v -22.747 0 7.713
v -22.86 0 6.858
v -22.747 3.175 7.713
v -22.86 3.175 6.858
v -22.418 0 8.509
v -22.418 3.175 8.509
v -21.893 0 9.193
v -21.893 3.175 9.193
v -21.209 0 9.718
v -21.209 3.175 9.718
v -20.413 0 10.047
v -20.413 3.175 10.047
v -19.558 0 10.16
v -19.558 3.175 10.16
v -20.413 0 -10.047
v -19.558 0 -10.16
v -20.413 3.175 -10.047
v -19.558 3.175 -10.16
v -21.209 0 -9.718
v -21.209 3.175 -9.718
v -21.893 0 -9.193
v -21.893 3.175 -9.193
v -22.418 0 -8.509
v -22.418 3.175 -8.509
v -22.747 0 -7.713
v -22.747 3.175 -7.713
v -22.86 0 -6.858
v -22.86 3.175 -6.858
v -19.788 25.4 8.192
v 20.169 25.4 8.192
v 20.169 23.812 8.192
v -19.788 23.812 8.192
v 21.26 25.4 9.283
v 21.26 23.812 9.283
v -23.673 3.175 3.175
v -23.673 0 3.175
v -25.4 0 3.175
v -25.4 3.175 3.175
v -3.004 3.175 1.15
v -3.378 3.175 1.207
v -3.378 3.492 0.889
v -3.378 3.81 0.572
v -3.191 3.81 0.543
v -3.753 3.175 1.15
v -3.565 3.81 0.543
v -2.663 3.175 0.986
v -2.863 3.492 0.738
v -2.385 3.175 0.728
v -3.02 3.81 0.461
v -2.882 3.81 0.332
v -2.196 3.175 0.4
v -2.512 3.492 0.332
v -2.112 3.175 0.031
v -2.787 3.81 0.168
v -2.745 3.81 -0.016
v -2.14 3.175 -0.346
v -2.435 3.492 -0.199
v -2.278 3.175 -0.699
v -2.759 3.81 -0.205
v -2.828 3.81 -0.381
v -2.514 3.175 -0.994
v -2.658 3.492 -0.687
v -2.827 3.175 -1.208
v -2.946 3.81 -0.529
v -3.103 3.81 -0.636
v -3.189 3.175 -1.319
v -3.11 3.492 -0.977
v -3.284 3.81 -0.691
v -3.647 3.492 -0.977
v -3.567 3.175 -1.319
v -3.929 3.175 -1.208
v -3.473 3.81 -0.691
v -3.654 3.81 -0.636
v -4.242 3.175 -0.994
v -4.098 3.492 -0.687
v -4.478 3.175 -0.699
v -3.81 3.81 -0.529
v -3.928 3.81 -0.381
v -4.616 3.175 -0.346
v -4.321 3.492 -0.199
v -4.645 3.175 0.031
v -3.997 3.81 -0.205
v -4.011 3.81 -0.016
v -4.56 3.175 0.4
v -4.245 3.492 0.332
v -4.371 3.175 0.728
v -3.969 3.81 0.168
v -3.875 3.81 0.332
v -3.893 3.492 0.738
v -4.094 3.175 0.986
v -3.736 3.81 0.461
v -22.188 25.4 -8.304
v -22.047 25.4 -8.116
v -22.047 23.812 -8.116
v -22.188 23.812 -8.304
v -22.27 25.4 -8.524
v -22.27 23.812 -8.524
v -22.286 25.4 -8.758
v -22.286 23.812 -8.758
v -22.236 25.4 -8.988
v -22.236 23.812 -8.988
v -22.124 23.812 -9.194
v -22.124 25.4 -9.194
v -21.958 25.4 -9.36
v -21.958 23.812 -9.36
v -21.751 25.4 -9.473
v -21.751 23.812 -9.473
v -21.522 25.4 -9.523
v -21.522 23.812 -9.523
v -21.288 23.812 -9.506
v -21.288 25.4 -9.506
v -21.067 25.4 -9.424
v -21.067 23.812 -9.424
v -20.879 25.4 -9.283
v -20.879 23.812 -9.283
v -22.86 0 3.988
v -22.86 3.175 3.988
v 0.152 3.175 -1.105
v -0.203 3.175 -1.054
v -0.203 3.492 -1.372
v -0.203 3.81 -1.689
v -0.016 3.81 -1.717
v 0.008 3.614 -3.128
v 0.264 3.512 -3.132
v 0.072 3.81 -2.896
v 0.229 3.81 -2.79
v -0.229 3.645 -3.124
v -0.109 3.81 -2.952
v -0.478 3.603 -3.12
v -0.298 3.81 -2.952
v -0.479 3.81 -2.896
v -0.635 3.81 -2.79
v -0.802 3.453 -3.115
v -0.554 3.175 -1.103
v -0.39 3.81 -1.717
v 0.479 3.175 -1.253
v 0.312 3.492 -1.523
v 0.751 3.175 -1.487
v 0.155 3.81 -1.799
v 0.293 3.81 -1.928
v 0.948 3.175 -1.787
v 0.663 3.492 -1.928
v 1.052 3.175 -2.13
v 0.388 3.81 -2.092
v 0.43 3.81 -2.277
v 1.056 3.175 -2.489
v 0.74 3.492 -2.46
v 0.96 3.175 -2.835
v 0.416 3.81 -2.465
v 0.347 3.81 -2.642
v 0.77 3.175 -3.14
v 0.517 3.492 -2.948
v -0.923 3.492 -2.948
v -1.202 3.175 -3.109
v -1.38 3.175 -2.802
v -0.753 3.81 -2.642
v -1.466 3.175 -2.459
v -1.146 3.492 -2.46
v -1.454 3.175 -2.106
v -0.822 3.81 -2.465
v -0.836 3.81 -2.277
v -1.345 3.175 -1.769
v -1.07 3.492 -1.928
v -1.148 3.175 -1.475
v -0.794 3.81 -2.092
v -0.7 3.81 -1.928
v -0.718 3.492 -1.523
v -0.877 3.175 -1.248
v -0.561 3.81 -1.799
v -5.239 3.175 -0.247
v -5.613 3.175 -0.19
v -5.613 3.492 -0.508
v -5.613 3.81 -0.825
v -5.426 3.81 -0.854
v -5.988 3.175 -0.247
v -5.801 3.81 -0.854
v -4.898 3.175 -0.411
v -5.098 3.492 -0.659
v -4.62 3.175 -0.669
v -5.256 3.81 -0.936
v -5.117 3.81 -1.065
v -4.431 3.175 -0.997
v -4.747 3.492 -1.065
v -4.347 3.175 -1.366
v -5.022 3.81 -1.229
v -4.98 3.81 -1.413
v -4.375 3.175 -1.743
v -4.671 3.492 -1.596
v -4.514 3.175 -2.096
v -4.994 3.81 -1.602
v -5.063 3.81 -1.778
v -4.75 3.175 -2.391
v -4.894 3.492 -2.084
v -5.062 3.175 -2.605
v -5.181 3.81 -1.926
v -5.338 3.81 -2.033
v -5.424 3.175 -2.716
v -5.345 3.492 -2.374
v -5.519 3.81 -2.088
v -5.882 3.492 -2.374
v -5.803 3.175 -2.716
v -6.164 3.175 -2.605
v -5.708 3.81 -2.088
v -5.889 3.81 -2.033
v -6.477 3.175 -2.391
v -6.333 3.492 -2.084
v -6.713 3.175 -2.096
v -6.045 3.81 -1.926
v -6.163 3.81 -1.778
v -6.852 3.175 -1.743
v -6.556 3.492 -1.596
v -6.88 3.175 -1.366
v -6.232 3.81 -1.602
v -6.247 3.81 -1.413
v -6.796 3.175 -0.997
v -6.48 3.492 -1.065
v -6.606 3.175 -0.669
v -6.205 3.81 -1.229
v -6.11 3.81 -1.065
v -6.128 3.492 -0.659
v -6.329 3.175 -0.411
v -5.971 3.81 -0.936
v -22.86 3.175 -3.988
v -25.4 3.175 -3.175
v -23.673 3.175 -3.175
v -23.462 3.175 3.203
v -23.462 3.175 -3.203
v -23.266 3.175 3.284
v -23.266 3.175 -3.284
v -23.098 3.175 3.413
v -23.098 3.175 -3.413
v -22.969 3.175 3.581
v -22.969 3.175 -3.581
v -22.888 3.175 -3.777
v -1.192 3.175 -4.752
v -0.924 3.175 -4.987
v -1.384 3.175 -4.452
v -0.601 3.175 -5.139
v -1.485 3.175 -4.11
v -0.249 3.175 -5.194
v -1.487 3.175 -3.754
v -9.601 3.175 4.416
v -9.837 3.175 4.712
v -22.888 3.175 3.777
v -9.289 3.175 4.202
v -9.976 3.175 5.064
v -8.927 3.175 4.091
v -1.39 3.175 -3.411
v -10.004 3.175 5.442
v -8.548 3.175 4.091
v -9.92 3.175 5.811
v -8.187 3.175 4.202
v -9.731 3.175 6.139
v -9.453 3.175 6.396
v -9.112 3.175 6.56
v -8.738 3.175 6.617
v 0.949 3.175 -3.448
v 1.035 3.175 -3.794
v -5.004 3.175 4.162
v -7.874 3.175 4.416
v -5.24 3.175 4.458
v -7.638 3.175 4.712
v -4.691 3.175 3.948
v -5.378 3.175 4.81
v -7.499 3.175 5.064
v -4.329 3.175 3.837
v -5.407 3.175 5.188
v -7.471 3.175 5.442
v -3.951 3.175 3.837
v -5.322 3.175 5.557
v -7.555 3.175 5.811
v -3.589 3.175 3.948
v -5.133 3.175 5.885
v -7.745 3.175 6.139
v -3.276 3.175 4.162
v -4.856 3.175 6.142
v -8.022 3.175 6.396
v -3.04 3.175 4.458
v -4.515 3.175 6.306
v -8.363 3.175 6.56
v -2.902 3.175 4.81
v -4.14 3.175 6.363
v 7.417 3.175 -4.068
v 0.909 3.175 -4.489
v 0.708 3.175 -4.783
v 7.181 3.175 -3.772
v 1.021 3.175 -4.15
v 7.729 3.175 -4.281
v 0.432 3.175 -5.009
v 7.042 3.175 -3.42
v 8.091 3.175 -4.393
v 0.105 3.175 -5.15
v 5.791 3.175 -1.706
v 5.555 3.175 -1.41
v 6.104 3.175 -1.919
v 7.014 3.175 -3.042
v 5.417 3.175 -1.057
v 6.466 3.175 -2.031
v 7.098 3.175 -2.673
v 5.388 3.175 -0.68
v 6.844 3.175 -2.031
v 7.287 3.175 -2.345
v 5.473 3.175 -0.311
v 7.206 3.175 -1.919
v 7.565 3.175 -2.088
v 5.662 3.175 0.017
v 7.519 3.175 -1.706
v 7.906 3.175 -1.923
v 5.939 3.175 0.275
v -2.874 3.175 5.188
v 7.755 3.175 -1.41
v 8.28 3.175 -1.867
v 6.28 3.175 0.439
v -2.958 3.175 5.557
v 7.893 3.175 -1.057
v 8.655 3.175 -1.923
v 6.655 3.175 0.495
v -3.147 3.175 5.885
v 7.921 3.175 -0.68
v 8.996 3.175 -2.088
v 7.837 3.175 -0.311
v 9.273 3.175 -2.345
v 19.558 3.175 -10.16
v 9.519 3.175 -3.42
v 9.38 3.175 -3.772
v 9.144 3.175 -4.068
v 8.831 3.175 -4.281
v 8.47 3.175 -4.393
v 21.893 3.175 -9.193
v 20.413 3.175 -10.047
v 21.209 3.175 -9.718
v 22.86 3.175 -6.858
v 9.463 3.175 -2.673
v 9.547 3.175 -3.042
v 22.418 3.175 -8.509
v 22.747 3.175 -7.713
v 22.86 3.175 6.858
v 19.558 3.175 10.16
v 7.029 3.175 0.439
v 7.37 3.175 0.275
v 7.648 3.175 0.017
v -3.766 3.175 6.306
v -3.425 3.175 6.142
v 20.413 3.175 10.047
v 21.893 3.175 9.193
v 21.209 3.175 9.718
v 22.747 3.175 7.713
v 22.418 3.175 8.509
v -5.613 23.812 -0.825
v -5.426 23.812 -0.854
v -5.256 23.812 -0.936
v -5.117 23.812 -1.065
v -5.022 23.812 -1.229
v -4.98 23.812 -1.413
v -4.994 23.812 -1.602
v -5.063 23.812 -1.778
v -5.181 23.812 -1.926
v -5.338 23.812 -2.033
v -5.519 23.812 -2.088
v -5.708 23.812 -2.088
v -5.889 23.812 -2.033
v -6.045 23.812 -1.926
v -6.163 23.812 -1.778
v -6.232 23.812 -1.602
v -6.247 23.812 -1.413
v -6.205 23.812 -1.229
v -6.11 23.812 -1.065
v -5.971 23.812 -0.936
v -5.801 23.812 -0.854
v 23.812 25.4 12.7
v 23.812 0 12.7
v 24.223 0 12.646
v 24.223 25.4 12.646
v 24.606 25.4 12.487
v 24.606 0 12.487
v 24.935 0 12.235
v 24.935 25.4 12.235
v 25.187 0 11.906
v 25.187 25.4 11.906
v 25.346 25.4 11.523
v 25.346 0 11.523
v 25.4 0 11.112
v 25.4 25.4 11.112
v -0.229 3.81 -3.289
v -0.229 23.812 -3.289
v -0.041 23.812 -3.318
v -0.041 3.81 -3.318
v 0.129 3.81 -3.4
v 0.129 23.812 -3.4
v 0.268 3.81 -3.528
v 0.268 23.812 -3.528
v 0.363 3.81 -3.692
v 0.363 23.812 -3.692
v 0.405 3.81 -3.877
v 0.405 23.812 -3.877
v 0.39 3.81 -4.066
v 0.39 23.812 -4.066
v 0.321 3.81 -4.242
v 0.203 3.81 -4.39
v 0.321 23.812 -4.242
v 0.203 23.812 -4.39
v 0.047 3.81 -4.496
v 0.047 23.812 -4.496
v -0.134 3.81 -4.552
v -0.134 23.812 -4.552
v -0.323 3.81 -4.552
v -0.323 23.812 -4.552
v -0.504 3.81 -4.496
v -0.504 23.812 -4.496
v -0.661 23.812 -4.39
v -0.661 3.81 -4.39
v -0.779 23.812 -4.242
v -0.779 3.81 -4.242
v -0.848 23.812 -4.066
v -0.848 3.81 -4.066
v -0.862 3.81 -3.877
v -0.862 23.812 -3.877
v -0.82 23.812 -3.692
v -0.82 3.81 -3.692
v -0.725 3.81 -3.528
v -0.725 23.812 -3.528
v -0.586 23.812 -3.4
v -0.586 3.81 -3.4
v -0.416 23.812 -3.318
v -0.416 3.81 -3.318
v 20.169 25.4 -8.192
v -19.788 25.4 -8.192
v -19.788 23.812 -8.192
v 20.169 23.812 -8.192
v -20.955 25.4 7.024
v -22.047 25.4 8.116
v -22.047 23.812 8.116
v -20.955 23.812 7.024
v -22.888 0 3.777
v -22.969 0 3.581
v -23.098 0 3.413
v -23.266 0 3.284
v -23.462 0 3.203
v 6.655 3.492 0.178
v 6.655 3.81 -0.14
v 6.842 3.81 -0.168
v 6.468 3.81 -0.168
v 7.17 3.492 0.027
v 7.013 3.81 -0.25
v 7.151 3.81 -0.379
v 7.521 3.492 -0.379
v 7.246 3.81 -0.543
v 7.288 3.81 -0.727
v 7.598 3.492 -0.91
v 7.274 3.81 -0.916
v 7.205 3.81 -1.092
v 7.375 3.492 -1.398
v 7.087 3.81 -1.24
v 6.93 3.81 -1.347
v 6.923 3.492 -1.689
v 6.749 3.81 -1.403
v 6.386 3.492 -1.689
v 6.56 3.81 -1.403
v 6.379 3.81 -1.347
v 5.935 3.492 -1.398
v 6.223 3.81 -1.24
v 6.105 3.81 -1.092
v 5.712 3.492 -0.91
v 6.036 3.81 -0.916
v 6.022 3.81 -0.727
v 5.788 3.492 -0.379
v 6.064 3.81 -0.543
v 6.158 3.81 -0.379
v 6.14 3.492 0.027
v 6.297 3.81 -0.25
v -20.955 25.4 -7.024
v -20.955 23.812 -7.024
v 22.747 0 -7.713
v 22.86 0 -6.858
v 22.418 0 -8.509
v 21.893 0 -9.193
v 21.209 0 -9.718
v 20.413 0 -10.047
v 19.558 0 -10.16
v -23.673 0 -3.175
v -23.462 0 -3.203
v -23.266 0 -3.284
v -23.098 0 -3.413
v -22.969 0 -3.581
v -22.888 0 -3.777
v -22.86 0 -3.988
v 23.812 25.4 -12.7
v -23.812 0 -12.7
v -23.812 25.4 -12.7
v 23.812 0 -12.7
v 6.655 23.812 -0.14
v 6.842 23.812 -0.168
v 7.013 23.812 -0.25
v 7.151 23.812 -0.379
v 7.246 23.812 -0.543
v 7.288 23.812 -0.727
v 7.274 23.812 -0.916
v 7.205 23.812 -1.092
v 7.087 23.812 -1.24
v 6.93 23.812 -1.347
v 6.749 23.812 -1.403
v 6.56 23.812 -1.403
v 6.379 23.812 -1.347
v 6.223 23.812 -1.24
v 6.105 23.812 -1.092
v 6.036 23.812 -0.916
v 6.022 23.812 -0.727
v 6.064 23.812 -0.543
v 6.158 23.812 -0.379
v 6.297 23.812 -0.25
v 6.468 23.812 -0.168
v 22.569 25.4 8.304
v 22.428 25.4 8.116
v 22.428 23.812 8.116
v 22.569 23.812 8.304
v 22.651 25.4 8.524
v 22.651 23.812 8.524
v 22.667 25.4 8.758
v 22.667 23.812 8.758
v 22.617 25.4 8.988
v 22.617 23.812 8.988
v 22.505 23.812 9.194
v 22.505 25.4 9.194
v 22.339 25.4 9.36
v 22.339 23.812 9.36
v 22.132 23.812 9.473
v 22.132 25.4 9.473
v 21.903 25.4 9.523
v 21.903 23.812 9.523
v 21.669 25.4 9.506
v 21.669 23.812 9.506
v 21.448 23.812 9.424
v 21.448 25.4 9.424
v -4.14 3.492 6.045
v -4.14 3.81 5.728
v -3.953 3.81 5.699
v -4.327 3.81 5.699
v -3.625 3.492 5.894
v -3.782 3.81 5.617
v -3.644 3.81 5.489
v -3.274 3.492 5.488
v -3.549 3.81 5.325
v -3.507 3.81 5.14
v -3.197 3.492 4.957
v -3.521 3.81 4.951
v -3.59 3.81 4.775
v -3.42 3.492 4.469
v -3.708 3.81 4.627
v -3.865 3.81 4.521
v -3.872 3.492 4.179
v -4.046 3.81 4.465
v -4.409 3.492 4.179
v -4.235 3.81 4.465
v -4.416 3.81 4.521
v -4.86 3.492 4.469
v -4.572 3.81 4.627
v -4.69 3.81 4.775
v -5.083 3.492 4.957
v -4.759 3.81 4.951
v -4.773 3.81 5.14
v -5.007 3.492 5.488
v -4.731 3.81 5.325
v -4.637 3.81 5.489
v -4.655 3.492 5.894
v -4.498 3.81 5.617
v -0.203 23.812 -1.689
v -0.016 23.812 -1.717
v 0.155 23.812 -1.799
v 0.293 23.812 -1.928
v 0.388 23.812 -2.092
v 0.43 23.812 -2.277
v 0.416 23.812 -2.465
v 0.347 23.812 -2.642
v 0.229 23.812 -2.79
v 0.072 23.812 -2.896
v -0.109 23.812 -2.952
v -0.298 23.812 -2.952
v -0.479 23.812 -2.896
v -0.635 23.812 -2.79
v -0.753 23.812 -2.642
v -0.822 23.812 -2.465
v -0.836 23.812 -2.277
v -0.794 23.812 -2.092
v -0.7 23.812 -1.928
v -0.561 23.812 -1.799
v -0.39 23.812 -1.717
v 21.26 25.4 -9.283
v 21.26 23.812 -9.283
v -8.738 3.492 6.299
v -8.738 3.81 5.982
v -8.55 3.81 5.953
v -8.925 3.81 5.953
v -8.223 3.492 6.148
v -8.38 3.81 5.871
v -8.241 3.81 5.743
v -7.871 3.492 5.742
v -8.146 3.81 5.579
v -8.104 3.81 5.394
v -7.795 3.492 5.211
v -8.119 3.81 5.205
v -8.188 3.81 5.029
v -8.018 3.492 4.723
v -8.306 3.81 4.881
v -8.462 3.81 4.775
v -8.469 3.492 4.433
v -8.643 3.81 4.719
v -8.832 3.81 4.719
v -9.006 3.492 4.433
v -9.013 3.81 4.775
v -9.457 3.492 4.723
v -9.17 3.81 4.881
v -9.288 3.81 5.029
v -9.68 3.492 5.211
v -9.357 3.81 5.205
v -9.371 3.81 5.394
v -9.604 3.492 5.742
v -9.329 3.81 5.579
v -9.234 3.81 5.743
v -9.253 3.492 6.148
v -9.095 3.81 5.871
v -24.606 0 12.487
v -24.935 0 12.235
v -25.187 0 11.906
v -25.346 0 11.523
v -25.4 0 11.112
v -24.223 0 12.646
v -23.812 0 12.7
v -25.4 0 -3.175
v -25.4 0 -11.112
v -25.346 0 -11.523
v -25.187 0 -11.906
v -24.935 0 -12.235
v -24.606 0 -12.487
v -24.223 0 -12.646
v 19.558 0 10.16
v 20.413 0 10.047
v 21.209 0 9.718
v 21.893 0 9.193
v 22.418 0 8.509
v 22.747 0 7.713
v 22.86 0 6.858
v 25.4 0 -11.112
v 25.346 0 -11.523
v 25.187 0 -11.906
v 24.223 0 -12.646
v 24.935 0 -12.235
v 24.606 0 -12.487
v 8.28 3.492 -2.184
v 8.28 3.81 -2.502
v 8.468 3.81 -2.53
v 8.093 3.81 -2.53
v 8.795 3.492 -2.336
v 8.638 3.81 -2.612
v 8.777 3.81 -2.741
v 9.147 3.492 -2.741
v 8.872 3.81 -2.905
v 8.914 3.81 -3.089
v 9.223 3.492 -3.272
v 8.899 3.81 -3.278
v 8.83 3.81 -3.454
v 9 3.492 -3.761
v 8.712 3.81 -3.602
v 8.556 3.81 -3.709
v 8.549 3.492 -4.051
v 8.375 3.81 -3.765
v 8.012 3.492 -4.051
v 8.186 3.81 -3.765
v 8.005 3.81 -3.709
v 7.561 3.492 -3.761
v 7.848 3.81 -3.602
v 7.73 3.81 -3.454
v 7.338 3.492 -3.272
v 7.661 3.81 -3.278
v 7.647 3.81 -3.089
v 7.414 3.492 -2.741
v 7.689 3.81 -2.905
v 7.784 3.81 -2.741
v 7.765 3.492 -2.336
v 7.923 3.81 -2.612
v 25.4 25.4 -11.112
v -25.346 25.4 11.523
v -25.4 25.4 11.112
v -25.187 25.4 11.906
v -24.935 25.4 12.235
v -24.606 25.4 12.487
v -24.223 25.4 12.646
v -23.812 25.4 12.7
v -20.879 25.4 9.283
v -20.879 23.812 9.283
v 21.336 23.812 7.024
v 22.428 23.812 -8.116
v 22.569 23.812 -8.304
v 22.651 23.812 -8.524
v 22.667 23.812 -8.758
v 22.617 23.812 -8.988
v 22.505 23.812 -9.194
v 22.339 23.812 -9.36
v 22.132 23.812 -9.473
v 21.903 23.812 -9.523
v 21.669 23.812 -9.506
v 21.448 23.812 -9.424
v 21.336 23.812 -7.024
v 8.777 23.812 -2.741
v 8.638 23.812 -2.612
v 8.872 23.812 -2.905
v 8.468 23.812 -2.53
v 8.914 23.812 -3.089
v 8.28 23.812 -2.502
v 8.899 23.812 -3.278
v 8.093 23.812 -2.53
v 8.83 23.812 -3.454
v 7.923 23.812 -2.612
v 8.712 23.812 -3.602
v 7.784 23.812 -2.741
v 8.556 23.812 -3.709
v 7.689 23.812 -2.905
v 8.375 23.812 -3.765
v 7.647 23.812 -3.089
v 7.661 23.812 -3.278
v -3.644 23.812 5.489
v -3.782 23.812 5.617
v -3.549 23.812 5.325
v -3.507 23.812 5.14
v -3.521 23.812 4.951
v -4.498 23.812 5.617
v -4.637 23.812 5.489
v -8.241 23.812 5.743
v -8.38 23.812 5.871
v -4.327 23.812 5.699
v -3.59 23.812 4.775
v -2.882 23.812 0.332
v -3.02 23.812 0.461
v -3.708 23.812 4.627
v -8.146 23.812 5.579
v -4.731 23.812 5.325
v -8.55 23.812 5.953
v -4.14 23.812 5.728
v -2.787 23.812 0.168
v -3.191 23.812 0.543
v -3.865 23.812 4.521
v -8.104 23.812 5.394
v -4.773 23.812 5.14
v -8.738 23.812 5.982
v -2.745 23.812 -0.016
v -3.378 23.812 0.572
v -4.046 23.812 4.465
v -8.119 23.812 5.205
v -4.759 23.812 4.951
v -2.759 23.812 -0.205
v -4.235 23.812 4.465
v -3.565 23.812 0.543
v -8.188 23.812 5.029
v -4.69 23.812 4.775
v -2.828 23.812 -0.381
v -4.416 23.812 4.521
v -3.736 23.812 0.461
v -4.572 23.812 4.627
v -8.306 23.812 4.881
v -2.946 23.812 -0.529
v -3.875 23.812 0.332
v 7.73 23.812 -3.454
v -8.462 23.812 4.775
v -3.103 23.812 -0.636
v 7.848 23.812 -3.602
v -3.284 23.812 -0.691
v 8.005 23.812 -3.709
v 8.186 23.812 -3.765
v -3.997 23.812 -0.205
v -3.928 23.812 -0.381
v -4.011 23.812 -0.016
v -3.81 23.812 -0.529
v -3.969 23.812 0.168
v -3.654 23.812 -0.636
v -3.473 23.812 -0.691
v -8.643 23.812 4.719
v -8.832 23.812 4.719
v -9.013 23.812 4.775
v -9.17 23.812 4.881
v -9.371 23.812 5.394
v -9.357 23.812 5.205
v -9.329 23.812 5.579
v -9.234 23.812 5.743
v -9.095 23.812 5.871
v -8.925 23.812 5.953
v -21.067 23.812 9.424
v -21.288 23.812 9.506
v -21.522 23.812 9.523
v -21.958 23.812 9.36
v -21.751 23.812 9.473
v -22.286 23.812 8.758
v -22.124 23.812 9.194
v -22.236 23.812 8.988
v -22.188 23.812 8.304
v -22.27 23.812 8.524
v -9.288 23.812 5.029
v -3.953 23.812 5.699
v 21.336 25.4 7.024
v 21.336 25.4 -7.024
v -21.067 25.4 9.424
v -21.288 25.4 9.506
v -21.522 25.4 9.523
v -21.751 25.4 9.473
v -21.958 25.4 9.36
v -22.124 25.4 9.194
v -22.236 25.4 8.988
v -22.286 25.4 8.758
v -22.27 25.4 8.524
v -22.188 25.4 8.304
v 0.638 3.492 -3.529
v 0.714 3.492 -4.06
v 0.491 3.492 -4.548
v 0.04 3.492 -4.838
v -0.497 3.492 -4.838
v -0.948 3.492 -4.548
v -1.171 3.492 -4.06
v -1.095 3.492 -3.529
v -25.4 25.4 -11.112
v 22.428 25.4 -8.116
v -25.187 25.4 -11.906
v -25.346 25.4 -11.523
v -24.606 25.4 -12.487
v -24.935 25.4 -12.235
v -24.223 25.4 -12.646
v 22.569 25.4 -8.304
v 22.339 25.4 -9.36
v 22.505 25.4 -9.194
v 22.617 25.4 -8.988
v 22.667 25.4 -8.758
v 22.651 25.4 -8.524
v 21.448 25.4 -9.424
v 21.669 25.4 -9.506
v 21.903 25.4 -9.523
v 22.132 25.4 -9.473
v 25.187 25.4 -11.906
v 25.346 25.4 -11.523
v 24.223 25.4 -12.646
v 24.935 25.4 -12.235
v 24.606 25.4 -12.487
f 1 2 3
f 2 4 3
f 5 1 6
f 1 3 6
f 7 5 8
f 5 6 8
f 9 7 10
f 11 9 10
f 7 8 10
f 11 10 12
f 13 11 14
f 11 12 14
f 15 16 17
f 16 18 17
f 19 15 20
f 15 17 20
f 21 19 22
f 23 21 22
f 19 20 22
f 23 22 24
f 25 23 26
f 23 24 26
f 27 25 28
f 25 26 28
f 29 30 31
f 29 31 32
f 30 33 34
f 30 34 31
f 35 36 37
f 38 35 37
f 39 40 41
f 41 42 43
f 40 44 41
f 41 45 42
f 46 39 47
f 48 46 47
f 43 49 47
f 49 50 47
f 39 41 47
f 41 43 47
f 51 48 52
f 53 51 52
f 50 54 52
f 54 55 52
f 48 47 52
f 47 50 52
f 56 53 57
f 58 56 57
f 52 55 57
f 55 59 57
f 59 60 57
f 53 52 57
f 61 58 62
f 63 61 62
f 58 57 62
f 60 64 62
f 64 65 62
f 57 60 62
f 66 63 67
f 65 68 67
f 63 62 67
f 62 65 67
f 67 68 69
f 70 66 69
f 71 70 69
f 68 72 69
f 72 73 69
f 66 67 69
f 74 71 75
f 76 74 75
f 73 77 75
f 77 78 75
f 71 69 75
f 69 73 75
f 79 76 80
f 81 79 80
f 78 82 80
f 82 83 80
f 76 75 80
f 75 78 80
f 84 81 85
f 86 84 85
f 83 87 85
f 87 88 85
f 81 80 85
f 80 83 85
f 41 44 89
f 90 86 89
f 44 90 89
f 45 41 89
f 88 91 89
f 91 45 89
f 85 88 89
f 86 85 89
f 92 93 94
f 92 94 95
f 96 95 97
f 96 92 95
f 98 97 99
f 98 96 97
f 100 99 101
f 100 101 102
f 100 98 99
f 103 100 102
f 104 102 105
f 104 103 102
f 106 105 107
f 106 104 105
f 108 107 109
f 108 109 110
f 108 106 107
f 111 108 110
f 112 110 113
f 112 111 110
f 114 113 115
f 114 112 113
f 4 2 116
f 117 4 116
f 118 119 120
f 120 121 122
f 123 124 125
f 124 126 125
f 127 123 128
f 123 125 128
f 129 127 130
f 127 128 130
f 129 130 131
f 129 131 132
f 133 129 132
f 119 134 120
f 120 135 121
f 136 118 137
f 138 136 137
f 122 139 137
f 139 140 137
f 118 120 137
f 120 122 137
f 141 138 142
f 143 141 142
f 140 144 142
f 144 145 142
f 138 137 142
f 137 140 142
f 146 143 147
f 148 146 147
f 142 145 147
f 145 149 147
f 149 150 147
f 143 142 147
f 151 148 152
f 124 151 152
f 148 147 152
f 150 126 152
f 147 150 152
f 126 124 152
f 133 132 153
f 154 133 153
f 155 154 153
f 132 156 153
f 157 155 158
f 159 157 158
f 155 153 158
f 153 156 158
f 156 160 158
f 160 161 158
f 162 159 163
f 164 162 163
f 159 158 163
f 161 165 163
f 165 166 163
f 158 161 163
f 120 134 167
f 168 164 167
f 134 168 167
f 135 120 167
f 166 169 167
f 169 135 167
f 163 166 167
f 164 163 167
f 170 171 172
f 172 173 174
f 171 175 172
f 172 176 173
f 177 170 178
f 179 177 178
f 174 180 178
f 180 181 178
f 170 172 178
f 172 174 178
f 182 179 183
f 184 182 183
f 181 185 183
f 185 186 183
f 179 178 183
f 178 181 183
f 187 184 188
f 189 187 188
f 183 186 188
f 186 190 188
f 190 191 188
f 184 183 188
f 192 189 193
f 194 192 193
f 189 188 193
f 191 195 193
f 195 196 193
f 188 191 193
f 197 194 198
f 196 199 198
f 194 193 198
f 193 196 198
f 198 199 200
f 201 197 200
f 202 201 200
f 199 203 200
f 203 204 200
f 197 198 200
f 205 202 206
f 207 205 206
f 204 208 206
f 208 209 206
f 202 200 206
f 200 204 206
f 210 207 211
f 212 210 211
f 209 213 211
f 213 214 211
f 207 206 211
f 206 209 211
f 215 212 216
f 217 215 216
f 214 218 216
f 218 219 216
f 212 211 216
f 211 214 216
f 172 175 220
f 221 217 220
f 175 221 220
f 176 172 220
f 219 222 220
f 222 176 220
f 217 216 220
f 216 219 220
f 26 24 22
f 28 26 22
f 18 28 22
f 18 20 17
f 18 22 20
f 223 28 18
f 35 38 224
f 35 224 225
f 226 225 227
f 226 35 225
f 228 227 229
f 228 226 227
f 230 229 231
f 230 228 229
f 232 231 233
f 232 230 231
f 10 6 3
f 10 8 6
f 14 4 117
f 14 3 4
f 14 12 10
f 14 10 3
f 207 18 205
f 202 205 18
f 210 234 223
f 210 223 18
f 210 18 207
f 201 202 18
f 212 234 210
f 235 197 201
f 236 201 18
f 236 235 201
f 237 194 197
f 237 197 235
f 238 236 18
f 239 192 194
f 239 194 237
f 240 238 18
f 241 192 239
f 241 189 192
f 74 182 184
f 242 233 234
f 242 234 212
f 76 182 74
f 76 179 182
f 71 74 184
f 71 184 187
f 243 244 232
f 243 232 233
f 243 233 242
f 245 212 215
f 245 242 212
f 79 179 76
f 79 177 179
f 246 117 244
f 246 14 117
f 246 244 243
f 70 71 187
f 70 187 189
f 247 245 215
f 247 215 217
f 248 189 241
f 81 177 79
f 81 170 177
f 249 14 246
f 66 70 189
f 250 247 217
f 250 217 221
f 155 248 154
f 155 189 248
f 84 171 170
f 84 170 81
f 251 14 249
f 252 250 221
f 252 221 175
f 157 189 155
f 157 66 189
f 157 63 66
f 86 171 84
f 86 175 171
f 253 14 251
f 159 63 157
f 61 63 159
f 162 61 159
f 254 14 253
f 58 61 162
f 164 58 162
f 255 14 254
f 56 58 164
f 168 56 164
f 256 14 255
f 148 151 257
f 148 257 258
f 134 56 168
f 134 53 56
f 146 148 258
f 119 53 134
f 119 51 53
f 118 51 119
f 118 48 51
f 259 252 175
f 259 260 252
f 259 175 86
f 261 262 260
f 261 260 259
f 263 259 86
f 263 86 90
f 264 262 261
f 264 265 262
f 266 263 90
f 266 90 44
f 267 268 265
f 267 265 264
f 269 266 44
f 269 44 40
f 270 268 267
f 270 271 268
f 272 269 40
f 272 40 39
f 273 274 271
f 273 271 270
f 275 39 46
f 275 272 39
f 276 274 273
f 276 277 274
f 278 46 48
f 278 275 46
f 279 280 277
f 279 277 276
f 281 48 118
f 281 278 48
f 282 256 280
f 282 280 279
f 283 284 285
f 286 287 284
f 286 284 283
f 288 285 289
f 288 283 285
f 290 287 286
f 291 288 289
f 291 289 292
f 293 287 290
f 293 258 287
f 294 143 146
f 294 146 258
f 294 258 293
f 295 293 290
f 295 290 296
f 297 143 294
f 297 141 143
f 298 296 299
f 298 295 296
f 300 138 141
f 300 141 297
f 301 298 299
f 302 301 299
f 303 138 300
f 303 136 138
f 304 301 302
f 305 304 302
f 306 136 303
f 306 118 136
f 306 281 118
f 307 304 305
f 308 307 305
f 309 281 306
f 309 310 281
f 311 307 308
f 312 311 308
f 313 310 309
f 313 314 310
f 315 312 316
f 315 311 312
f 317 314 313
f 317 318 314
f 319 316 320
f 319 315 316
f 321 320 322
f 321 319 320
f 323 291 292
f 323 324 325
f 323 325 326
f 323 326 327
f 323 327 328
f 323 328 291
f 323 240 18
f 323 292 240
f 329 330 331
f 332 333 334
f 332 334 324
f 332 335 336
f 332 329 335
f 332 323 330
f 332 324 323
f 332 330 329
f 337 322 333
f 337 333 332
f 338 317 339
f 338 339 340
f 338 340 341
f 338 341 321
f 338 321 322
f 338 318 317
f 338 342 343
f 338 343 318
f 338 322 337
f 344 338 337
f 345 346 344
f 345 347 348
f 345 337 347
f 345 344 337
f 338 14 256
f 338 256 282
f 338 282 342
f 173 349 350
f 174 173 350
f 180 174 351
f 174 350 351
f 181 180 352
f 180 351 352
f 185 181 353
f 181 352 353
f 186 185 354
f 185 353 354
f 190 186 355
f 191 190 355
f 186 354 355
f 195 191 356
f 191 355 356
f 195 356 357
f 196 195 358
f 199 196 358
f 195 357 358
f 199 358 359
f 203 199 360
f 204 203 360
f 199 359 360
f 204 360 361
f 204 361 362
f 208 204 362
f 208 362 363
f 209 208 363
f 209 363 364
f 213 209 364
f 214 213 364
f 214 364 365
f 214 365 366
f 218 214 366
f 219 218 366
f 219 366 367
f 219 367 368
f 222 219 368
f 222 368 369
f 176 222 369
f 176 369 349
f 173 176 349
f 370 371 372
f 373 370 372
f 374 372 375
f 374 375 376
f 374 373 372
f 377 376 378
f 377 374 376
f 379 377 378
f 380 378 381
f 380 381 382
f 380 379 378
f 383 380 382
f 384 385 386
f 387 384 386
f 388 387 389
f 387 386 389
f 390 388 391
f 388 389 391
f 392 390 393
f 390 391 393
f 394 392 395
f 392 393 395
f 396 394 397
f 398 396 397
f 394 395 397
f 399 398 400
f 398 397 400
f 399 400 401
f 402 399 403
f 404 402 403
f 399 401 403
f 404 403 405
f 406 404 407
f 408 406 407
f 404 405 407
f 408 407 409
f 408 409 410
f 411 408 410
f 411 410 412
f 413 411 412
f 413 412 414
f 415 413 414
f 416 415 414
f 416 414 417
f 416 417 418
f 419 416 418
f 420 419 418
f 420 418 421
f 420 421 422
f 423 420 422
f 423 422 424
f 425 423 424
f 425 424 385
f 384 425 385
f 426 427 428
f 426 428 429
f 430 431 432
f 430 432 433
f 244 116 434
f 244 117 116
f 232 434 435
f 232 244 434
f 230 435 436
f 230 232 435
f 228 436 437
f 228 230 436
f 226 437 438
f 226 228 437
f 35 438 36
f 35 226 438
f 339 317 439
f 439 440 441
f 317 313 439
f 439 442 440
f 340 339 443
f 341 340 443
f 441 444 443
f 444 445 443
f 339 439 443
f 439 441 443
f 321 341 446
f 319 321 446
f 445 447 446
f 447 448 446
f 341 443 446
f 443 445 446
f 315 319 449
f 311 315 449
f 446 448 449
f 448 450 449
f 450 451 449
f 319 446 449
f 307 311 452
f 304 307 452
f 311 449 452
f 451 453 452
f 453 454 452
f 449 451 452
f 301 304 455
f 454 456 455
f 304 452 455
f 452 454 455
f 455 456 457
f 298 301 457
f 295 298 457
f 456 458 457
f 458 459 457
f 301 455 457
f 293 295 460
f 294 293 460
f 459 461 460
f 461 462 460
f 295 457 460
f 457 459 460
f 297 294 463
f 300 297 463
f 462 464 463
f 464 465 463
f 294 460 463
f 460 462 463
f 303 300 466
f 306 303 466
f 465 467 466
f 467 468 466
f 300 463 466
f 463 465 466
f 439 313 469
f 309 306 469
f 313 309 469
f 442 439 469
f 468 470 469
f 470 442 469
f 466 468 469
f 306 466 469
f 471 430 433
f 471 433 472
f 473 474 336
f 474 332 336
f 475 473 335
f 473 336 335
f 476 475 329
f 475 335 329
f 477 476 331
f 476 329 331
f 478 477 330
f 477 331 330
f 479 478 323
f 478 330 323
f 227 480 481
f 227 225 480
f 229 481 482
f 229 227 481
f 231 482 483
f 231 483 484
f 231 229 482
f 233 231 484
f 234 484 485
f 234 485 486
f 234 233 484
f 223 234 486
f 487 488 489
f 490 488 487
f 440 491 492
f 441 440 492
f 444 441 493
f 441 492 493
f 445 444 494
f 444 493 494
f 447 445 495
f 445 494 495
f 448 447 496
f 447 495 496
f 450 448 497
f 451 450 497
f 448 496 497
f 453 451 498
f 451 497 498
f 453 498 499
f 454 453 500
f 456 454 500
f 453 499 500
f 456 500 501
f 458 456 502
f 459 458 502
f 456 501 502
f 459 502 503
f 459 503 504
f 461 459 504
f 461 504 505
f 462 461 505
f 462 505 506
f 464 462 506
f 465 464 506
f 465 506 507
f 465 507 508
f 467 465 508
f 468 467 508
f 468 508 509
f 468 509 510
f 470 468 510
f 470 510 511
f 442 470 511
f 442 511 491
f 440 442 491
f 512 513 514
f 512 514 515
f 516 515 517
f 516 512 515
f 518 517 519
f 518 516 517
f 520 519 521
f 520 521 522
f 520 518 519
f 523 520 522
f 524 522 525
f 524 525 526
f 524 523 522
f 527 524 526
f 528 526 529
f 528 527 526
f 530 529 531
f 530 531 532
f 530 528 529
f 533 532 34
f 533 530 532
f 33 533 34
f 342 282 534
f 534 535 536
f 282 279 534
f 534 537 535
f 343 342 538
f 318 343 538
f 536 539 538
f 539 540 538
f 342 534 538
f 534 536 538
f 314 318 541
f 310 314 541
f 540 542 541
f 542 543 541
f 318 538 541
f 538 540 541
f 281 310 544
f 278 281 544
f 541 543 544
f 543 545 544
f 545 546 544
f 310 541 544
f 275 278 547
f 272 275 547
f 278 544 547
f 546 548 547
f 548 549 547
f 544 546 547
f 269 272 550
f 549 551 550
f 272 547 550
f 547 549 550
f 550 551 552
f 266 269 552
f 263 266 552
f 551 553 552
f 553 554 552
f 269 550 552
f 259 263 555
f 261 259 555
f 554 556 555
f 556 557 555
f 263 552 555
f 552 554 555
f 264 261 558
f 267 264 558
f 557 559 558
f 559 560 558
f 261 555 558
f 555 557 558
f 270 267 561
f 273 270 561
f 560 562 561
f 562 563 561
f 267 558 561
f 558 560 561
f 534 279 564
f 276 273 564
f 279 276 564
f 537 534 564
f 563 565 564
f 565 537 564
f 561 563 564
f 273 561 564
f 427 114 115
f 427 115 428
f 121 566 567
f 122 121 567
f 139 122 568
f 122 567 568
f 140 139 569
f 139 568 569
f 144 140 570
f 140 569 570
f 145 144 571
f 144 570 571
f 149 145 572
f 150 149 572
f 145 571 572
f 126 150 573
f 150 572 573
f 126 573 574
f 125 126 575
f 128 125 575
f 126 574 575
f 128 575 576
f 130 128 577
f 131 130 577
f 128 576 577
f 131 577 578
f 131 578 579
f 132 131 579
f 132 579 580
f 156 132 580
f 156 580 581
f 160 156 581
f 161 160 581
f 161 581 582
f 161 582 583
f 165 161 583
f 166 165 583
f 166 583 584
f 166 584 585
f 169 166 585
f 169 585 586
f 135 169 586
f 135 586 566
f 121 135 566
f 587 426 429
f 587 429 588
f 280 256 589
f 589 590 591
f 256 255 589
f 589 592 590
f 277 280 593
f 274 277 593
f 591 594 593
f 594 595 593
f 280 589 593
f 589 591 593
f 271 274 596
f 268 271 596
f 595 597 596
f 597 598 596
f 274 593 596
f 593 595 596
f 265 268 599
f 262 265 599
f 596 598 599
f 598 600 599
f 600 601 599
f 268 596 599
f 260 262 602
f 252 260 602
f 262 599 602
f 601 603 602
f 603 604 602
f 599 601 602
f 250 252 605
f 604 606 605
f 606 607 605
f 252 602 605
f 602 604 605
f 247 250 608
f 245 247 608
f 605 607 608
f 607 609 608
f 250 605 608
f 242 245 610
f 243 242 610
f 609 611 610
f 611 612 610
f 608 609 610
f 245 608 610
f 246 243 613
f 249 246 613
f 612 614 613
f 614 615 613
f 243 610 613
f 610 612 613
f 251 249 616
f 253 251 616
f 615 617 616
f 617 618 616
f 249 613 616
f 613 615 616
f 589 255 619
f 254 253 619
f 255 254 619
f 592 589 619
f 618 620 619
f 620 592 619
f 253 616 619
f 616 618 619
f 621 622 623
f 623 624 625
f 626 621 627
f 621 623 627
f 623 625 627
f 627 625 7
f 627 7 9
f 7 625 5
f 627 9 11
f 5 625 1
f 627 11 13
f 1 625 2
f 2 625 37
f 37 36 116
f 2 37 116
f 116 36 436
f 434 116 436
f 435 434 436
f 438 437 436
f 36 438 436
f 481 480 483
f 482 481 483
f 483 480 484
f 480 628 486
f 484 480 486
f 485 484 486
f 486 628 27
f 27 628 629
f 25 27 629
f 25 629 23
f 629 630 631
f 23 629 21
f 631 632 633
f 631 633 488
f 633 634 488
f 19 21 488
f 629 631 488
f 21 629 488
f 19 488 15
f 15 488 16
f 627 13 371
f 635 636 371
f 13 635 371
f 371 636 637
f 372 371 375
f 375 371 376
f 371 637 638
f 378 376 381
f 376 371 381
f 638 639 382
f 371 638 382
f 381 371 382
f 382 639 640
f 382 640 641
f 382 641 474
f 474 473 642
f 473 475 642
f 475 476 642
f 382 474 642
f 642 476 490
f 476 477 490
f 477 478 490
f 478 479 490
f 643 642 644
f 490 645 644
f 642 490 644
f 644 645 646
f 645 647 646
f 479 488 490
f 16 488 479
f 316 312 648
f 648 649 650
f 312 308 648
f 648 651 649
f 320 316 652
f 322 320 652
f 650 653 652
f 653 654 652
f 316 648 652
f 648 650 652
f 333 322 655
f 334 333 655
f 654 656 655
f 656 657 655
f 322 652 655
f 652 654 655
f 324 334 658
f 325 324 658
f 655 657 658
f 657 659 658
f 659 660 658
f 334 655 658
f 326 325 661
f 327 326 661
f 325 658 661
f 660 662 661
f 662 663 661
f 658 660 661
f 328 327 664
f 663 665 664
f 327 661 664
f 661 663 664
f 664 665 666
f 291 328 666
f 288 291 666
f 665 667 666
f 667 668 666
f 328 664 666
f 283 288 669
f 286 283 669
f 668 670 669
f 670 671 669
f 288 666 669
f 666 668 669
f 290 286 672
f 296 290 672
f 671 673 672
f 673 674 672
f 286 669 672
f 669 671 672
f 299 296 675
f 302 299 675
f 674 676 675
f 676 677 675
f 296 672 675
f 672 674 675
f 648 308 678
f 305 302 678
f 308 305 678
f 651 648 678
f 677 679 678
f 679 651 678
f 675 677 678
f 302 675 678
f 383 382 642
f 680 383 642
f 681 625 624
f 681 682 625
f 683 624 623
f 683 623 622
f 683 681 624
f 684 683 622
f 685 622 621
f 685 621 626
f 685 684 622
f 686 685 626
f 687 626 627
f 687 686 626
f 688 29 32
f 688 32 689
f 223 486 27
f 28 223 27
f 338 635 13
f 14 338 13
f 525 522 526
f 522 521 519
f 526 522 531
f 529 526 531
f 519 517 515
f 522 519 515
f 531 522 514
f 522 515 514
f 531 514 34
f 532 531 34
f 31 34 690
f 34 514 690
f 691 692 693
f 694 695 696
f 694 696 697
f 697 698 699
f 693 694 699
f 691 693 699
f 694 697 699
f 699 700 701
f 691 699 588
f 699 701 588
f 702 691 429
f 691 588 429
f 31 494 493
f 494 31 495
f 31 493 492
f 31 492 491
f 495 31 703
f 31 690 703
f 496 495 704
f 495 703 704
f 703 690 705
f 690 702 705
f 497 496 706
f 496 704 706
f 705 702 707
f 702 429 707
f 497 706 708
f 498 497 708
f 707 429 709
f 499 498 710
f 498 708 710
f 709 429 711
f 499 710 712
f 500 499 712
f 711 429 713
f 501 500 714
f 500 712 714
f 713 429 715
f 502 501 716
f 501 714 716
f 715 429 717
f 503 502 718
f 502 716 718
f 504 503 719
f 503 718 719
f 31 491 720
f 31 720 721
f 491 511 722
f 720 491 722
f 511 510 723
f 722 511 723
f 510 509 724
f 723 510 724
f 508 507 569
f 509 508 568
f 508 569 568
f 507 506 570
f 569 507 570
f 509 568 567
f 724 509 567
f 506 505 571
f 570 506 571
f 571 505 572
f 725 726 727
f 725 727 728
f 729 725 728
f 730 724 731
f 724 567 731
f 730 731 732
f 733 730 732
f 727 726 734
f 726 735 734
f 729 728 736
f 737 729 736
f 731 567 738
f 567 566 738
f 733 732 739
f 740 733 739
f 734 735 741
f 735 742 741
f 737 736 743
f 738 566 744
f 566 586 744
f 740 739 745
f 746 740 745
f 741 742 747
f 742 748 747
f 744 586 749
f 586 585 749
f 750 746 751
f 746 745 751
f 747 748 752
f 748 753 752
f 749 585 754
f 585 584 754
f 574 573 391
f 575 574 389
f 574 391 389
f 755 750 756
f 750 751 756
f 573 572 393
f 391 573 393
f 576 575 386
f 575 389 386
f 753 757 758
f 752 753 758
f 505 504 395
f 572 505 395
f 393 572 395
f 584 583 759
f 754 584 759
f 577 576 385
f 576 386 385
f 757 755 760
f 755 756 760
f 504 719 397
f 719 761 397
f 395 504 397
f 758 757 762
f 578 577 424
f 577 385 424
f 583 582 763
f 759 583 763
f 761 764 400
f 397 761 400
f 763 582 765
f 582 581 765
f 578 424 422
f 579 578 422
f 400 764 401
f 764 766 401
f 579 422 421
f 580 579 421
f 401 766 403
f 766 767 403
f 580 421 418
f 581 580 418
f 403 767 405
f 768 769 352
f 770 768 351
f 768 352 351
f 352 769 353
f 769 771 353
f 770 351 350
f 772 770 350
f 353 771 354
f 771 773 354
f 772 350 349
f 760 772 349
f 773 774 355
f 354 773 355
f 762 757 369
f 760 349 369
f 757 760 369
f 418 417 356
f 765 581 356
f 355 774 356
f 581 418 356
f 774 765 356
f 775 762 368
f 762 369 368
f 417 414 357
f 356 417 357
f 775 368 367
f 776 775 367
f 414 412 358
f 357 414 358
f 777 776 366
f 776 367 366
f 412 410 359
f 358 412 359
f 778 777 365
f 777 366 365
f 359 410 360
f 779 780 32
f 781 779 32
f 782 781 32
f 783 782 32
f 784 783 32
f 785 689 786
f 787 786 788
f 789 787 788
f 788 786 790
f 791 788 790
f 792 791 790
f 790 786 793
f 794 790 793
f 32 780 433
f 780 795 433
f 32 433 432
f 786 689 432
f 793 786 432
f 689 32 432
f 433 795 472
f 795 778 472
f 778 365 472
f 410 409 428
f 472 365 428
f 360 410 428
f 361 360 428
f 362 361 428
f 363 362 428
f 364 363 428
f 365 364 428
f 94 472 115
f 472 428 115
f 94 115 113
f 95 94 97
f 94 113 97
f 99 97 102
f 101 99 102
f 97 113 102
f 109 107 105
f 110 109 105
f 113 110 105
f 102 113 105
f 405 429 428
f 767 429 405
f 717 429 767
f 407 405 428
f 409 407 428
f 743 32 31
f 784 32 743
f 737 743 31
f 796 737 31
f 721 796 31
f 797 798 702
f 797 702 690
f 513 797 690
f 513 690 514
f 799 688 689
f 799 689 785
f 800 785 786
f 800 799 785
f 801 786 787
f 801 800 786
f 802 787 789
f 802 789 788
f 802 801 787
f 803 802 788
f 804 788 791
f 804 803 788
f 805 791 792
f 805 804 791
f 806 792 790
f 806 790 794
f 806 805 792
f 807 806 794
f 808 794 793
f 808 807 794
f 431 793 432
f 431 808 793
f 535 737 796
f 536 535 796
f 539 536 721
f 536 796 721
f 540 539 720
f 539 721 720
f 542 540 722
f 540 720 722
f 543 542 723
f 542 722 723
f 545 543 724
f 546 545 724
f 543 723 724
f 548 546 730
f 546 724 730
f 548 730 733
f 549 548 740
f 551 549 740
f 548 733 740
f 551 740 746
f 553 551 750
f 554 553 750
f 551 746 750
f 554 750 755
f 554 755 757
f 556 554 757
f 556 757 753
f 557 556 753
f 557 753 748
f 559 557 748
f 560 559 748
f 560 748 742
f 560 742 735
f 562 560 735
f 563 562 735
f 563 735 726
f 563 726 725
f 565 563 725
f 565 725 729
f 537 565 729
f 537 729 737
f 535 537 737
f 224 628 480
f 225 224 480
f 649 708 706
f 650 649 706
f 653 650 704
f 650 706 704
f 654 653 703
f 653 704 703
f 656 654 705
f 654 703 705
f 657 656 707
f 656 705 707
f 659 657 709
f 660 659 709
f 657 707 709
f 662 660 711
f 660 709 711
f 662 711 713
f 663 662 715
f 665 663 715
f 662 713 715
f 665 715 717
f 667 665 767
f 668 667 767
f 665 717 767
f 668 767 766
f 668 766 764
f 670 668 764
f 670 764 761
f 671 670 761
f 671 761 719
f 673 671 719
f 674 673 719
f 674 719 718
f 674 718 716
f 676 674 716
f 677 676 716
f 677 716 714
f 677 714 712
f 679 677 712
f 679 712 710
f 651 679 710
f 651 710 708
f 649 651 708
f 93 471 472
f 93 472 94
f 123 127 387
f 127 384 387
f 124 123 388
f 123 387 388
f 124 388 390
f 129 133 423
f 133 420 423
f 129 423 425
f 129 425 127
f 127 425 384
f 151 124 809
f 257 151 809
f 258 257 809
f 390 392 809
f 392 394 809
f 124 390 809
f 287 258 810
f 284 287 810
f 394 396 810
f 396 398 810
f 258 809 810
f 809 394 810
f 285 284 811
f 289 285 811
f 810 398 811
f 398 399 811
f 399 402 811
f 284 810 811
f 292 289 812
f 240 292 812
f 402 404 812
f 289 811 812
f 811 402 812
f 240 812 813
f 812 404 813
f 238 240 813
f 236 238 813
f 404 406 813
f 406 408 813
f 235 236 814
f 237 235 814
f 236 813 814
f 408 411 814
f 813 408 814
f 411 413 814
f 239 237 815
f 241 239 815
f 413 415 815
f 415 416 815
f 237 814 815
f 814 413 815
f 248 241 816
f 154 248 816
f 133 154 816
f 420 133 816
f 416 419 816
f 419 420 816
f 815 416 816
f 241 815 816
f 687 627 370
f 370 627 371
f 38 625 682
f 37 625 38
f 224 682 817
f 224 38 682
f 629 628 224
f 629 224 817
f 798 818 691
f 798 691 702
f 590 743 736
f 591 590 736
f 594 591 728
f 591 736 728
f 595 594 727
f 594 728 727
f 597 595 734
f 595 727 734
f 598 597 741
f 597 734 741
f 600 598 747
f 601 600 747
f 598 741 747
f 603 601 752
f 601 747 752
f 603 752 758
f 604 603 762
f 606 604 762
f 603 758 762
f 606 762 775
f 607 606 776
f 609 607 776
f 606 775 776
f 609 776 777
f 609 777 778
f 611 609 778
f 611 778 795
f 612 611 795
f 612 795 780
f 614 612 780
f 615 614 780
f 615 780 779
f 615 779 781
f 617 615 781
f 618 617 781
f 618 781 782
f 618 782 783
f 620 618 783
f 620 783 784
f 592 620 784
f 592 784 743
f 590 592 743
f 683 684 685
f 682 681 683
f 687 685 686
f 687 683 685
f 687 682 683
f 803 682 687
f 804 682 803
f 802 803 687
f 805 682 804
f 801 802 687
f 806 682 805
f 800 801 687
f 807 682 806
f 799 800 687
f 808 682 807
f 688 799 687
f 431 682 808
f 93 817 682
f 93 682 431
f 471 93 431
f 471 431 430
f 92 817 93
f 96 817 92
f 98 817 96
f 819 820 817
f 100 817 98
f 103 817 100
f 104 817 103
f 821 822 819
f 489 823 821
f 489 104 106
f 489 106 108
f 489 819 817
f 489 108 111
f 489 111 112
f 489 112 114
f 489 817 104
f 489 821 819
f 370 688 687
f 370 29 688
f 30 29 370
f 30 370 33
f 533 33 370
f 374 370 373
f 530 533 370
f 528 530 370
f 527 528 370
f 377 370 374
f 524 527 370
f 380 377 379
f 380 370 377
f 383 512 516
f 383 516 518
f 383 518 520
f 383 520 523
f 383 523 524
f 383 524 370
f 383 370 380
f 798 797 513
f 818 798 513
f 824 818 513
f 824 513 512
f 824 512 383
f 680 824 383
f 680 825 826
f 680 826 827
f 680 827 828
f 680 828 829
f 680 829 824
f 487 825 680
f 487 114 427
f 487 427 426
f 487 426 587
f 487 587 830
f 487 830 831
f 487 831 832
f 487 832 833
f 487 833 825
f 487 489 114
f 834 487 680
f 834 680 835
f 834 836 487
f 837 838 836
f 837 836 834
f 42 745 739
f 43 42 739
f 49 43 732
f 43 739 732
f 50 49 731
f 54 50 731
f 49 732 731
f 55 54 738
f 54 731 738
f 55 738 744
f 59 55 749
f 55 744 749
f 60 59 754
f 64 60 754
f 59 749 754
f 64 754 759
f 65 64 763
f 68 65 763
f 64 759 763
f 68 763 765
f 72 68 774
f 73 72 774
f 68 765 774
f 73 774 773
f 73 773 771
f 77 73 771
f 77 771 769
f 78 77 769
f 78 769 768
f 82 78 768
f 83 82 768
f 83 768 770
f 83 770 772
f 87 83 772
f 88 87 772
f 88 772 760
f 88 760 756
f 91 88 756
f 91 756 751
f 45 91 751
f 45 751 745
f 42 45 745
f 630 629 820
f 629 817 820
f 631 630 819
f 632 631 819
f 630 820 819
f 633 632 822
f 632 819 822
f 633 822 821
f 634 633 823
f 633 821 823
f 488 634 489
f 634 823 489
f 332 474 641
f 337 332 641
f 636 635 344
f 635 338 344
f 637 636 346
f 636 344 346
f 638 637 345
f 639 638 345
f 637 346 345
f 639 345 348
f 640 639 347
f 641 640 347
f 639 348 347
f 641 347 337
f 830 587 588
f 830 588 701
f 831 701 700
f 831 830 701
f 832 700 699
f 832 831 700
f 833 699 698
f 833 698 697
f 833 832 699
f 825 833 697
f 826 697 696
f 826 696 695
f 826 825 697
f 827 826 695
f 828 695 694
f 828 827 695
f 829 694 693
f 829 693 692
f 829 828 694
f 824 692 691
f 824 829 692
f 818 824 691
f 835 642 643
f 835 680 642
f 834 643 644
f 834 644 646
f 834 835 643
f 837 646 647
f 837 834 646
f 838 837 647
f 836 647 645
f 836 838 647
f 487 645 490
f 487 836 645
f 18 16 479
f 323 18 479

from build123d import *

# Parameters (mm, degrees)
SKETCH1_W           = 50.8
SKETCH1_H           = 25.4
BOSS_EXTRUDE1_DEPTH = 25.4
SKETCH6_R           = 0.635
CUT_EXTRUDE1_DEPTH  = 39.1
CUT_EXTRUDE2_DEPTH  = 1.5875
CUT_EXTRUDE3_DEPTH  = 3.175
FILLET1_R           = 3.302
FILLET2_R           = 0.8128
CHAMFER1_SIZE       = 0.635
FILLET3_R           = 1.5875


with BuildPart() as part:
    # Sketch1 → Boss-Extrude1 (new body)
    with BuildSketch(Plane(origin=(0, 0, 0), x_dir=(1, 0, 0), z_dir=(0, 1, 0))):
        Rectangle(SKETCH1_W, SKETCH1_H)
    extrude(amount=BOSS_EXTRUDE1_DEPTH)

    # Sketch6 → Cut-Extrude1 (cut, through all)
    with BuildSketch(Plane(origin=(0, 25.4, 0), x_dir=(1, 0, 0), z_dir=(0, 1, 0))):
        with Locations(Location((-5.6134, 1.4605, 0), (0, 0, 270))):
            Circle(SKETCH6_R)
        with Locations(Location((-0.2286, 3.9243, 0), (0, 0, 270))):
            Circle(SKETCH6_R)
        with Locations(Location((-0.2032, 2.3241, 0), (0, 0, 270))):
            Circle(SKETCH6_R)
        with Locations(Location((-4.1402, -5.0927, 0), (0, 0, 270))):
            Circle(SKETCH6_R)
        with Locations(Location((-8.7376, -5.3467, 0), (0, 0, 270))):
            Circle(SKETCH6_R)
        with Locations(Location((6.6548, 0.7747, 0), (0, 0, 270))):
            Circle(SKETCH6_R)
        with Locations(Location((8.2804, 3.1369, 0), (0, 0, 270))):
            Circle(SKETCH6_R)
        with Locations(Location((-3.3782, 0.0635, 0), (0, 0, 270))):
            Circle(SKETCH6_R)
    extrude(amount=-CUT_EXTRUDE1_DEPTH, mode=Mode.SUBTRACT)

    # Sketch7 → Cut-Extrude2 (cut)
    with BuildSketch(Plane(origin=(0, 25.4, 0), x_dir=(1, 0, 0), z_dir=(0, 1, 0))):
        with BuildLine():
            Line((-20.955, -7.024066704), (-20.955, 7.024066704))
            Line((-20.955, 7.024066704), (-22.046716648, 8.115783352))
            ThreePointArc((-22.046716648, 8.115783352), (-22.046716648, 9.283216648), (-20.879283352, 9.283216648))
            Line((-20.879283352, 9.283216648), (-19.787566704, 8.1915))
            Line((-19.787566704, 8.1915), (20.168566704, 8.1915))
            Line((20.168566704, 8.1915), (21.260283352, 9.283216648))
            ThreePointArc((21.260283352, 9.283216648), (22.427716648, 9.283216648), (22.427716648, 8.115783352))
            Line((22.427716648, 8.115783352), (21.336, 7.024066704))
            Line((21.336, 7.024066704), (21.336, -7.024066704))
            Line((21.336, -7.024066704), (22.427716648, -8.115783352))
            ThreePointArc((22.427716648, -8.115783352), (22.427716648, -9.283216648), (21.260283352, -9.283216648))
            Line((21.260283352, -9.283216648), (20.168566704, -8.1915))
            Line((20.168566704, -8.1915), (-19.787566704, -8.1915))
            Line((-19.787566704, -8.1915), (-20.879283352, -9.283216648))
            ThreePointArc((-20.879283352, -9.283216648), (-22.046716648, -9.283216648), (-22.046716648, -8.115783352))
            Line((-22.046716648, -8.115783352), (-20.955, -7.024066704))
        make_face()
    extrude(amount=-CUT_EXTRUDE2_DEPTH, mode=Mode.SUBTRACT)

    # Sketch8 → Cut-Extrude3 (cut)
    with BuildSketch(Plane.XZ):
        Polygon((22.86, 10.16), (-22.86, 10.16), (-22.86, 3.175), (-25.4, 3.175), (-25.4, -3.175), (-22.86, -3.175), (-22.86, -10.16), (22.86, -10.16), align=None)
    extrude(amount=-CUT_EXTRUDE3_DEPTH, mode=Mode.SUBTRACT)

    # Fillet1
    fillet1_edges = [part.edges().sort_by_distance(p)[0] for p in [
        (22.86, 1.5875, 10.16),
        (22.86, 1.5875, -10.16),
        (-22.86, 1.5875, -10.16),
        (-22.86, 1.5875, 10.16),
    ]]
    fillet(fillet1_edges, radius=FILLET1_R)

    # Fillet2
    fillet2_edges = [part.edges().sort_by_distance(p)[0] for p in [
        (-22.86, 1.5875, -3.175),
        (-22.86, 1.5875, 3.175),
    ]]
    fillet(fillet2_edges, radius=FILLET2_R)

    # Chamfer1
    # the kernel refuses this chamfer: 0.635 mm, written as the material it takes off along each edge
    with BuildSketch(Plane(origin=(-5.6134, 3.175, -1.4605), x_dir=(0, 0, 1), z_dir=(-1, 0, 0))) as chamfer1_piece_1:
        Polygon((0.635 + CHAMFER1_SIZE, 0), (0.635, CHAMFER1_SIZE), (0.635, 0), align=None)
    revolve(axis=Axis((-5.6134, 3.175, -1.4605), (0, 1, 0)), mode=Mode.SUBTRACT)
    with BuildSketch(Plane(origin=(-0.2286, 3.175, -3.9243), x_dir=(0, 0, 1), z_dir=(-1, 0, 0))) as chamfer1_piece_2:
        Polygon((0.635 + CHAMFER1_SIZE, 0), (0.635, CHAMFER1_SIZE), (0.635, 0), align=None)
    revolve(axis=Axis((-0.2286, 3.175, -3.9243), (0, 1, 0)), mode=Mode.SUBTRACT)
    with BuildSketch(Plane(origin=(-0.2032, 3.175, -2.3241), x_dir=(0, 0, 1), z_dir=(-1, 0, 0))) as chamfer1_piece_3:
        Polygon((0.635 + CHAMFER1_SIZE, 0), (0.635, CHAMFER1_SIZE), (0.635, 0), align=None)
    revolve(axis=Axis((-0.2032, 3.175, -2.3241), (0, 1, 0)), mode=Mode.SUBTRACT)
    with BuildSketch(Plane(origin=(-4.1402, 3.175, 5.0927), x_dir=(0, 0, 1), z_dir=(-1, 0, 0))) as chamfer1_piece_4:
        Polygon((0.635 + CHAMFER1_SIZE, 0), (0.635, CHAMFER1_SIZE), (0.635, 0), align=None)
    revolve(axis=Axis((-4.1402, 3.175, 5.0927), (0, 1, 0)), mode=Mode.SUBTRACT)
    with BuildSketch(Plane(origin=(-8.7376, 3.175, 5.3467), x_dir=(0, 0, 1), z_dir=(-1, 0, 0))) as chamfer1_piece_5:
        Polygon((0.635 + CHAMFER1_SIZE, 0), (0.635, CHAMFER1_SIZE), (0.635, 0), align=None)
    revolve(axis=Axis((-8.7376, 3.175, 5.3467), (0, 1, 0)), mode=Mode.SUBTRACT)
    with BuildSketch(Plane(origin=(6.6548, 3.175, -0.7747), x_dir=(0, 0, 1), z_dir=(-1, 0, 0))) as chamfer1_piece_6:
        Polygon((0.635 + CHAMFER1_SIZE, 0), (0.635, CHAMFER1_SIZE), (0.635, 0), align=None)
    revolve(axis=Axis((6.6548, 3.175, -0.7747), (0, 1, 0)), mode=Mode.SUBTRACT)
    with BuildSketch(Plane(origin=(8.2804, 3.175, -3.1369), x_dir=(0, 0, 1), z_dir=(-1, 0, 0))) as chamfer1_piece_7:
        Polygon((0.635 + CHAMFER1_SIZE, 0), (0.635, CHAMFER1_SIZE), (0.635, 0), align=None)
    revolve(axis=Axis((8.2804, 3.175, -3.1369), (0, 1, 0)), mode=Mode.SUBTRACT)
    with BuildSketch(Plane(origin=(-3.3782, 3.175, -0.0635), x_dir=(0, 0, 1), z_dir=(-1, 0, 0))) as chamfer1_piece_8:
        Polygon((0.635 + CHAMFER1_SIZE, 0), (0.635, CHAMFER1_SIZE), (0.635, 0), align=None)
    revolve(axis=Axis((-3.3782, 3.175, -0.0635), (0, 1, 0)), mode=Mode.SUBTRACT)

    # Fillet3
    fillet3_edges = [part.edges().sort_by_distance(p)[0] for p in [
        (-25.4, 12.7, -12.7),
        (25.4, 12.7, -12.7),
        (25.4, 12.7, 12.7),
        (-25.4, 12.7, 12.7),
    ]]
    fillet(fillet3_edges, radius=FILLET3_R)


solid = part.part
